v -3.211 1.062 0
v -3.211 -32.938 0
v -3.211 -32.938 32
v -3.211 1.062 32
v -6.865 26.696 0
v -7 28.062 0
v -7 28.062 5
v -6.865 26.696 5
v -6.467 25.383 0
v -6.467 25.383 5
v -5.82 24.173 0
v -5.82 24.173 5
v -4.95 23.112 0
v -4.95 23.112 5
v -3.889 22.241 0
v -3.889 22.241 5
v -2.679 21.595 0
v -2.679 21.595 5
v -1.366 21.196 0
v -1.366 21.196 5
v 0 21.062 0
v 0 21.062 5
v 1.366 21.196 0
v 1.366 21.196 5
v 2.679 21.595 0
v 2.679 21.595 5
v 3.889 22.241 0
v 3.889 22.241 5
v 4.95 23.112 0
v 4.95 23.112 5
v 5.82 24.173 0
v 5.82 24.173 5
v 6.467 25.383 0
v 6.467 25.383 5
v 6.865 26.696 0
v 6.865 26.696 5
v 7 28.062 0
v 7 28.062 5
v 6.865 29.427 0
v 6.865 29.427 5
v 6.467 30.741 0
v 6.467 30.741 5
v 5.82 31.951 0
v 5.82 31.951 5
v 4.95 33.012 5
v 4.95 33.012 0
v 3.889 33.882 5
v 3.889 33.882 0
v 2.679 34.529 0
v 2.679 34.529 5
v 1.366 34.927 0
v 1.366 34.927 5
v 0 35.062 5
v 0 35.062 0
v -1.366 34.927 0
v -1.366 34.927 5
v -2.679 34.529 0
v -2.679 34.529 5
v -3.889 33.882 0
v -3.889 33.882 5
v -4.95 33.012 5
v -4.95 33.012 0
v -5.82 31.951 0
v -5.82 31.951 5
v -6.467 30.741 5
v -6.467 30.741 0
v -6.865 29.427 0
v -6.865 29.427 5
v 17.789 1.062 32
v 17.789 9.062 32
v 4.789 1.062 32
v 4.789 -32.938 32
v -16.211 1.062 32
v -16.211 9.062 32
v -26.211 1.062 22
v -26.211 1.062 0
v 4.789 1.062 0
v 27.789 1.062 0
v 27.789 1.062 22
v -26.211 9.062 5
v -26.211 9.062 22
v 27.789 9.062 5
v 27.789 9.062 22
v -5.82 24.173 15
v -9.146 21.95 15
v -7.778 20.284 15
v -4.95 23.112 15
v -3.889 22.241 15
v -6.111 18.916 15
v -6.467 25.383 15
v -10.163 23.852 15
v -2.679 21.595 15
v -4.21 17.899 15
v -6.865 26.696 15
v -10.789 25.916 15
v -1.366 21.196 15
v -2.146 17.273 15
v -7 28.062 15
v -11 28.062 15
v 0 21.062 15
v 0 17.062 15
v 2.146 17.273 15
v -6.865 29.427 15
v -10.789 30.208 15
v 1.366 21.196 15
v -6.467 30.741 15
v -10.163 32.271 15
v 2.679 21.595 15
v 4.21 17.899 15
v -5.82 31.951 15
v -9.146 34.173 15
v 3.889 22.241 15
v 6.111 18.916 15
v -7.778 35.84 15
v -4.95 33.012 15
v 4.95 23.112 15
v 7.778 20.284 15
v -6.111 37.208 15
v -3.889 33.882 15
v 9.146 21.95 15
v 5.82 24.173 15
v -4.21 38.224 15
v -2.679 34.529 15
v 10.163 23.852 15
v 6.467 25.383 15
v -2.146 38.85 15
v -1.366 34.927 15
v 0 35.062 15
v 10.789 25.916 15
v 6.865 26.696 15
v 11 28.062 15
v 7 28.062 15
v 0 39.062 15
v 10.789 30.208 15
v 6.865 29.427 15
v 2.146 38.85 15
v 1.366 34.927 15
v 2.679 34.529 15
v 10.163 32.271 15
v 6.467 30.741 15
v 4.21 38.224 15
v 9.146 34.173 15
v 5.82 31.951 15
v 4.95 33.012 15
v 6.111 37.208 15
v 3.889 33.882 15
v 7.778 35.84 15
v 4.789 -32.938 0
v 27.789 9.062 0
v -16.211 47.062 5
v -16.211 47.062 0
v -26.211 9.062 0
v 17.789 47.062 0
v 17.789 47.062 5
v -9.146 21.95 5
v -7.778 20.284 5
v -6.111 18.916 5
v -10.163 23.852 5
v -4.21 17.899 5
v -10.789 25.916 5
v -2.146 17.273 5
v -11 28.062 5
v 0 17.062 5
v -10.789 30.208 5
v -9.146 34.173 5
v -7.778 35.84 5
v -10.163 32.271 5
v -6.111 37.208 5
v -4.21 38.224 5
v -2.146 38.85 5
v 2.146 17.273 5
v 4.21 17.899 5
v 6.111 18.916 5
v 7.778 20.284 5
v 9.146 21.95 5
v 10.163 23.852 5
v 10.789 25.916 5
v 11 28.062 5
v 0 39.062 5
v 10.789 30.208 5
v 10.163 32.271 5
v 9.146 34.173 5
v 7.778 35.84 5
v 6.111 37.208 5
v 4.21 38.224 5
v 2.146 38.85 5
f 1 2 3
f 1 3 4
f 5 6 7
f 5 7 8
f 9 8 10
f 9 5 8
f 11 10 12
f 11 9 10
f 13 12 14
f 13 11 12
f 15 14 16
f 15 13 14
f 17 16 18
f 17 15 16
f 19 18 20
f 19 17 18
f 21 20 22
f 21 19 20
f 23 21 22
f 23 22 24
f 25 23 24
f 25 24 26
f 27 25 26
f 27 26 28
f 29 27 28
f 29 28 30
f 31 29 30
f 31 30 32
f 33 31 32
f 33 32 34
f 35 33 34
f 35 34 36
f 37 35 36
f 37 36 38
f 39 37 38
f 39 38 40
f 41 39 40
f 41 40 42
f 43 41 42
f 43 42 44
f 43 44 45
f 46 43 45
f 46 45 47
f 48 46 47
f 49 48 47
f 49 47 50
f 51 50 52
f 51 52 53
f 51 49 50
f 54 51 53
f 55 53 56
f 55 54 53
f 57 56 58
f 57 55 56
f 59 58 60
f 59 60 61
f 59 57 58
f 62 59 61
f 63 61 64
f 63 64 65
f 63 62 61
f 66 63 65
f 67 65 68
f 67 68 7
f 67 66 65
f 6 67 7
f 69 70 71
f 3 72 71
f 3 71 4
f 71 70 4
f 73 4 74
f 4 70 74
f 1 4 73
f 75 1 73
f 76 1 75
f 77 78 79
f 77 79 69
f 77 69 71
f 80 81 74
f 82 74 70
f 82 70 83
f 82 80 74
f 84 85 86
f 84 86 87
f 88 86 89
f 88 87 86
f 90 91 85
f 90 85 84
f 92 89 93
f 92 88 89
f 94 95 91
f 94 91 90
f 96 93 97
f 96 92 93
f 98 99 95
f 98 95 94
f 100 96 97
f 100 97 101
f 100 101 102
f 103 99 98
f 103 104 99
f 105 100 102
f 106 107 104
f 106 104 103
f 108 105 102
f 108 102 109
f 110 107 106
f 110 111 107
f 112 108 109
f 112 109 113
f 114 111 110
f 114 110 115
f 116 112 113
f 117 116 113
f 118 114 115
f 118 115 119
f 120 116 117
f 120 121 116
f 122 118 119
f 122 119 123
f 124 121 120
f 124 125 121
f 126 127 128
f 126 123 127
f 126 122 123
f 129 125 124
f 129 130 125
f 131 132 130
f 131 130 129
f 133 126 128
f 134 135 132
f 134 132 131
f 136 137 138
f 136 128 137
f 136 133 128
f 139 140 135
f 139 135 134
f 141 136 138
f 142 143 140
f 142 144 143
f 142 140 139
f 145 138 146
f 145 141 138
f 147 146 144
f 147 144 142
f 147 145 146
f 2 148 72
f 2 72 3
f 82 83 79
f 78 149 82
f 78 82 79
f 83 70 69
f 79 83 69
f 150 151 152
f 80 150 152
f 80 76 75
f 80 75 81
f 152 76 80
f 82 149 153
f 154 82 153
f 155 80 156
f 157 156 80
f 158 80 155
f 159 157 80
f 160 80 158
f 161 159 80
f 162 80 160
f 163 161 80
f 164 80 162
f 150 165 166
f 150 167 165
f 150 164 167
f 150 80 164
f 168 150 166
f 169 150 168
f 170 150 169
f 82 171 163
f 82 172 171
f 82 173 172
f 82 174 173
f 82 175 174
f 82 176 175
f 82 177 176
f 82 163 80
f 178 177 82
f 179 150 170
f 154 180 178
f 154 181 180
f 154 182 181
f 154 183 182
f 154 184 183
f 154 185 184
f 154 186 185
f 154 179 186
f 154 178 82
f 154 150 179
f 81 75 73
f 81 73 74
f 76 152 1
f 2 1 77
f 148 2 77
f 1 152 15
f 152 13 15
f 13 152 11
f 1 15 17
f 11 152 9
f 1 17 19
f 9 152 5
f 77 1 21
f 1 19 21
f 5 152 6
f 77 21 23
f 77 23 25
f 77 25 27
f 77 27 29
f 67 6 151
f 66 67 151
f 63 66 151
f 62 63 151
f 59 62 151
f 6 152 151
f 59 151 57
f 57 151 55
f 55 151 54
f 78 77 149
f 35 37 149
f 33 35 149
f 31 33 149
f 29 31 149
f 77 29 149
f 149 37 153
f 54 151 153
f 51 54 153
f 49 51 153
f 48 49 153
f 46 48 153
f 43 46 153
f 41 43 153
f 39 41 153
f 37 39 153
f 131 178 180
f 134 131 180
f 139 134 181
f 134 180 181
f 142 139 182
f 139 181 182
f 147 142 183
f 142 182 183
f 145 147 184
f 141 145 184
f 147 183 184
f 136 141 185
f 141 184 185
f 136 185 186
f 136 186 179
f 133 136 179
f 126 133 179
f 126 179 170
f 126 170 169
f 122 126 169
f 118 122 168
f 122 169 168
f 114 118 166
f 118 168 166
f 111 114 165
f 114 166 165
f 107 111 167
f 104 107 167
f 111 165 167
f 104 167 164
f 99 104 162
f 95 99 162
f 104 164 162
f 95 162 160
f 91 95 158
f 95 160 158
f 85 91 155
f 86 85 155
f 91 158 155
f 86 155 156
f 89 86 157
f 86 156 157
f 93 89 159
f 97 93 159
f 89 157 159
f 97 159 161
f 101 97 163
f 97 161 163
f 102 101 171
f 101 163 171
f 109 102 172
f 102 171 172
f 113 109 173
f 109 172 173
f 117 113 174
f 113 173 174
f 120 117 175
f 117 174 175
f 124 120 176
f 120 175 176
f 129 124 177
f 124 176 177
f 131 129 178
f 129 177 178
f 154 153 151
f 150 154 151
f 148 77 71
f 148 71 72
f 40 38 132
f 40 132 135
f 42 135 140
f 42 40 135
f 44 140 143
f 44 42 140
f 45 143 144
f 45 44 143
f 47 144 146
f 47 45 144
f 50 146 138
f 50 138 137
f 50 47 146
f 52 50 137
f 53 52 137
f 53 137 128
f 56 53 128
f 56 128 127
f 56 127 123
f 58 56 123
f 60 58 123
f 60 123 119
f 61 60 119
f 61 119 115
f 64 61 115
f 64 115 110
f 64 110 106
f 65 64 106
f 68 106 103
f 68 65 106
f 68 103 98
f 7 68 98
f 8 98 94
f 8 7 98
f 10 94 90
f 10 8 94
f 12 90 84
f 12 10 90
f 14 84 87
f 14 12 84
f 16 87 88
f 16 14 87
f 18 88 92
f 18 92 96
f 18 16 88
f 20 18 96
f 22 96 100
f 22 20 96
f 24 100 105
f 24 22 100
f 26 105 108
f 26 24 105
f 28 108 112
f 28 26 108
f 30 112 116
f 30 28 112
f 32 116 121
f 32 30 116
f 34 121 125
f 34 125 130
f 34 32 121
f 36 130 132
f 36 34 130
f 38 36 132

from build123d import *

# Parameters (mm, degrees)
BOSS_EXTRUDE1_DEPTH = 32
CHAMFER3_SIZE       = 10
CHAMFER4_SIZE       = 10
BOSS_EXTRUDE3_DEPTH = 5
SKETCH6_R           = 11
SKETCH6_R_2         = 7
BOSS_EXTRUDE4_DEPTH = 10
CUT_EXTRUDE1_START  = -10
SKETCH7_R           = 7
CUT_EXTRUDE1_DEPTH  = 10


with BuildPart() as part:
    # Sketch2 → Boss-Extrude1 (new body)
    with BuildSketch(Plane.XY):
        Polygon((4.788542225, -32.938228069), (-3.211457775, -32.938228069), (-3.211457775, 1.061771931), (-26.211457775, 1.061771931), (-26.211457775, 9.061771931), (27.788542225, 9.061771931), (27.788542225, 1.061771931), (4.788542225, 1.061771931), align=None)
    extrude(amount=BOSS_EXTRUDE1_DEPTH)

    # Chamfer3
    chamfer3_edges = [part.edges().sort_by_distance(p)[0] for p in [
        (27.788542225, 5.061771931, 32),
    ]]
    chamfer(chamfer3_edges, length=CHAMFER3_SIZE)

    # Chamfer4
    chamfer4_edges = [part.edges().sort_by_distance(p)[0] for p in [
        (-26.211457775, 5.061771931, 32),
    ]]
    chamfer(chamfer4_edges, length=CHAMFER4_SIZE)

    # Sketch5 → Boss-Extrude3 (add)
    with BuildSketch(Plane.XY):
        Polygon((27.788542225, 9.061771931), (17.788542225, 47.061771931), (-16.211457775, 47.061771931), (-26.211457775, 9.061771931), align=None)
    extrude(amount=BOSS_EXTRUDE3_DEPTH)

    # Sketch6 → Boss-Extrude4 (add)
    with BuildSketch(Plane.XY.offset(5)):
        with Locations((0, 28.061771931)):
            Circle(SKETCH6_R)
        with Locations((0, 28.061771931)):
            Circle(SKETCH6_R_2, mode=Mode.SUBTRACT)
    extrude(amount=BOSS_EXTRUDE4_DEPTH)

    # Sketch7 → Cut-Extrude1 (cut)
    with BuildSketch(Plane.XY.offset(5).offset(CUT_EXTRUDE1_START)):
        with Locations(Location((0, 28.061771931, 0), (0, 0, 180))):
            Circle(SKETCH7_R)
    extrude(amount=CUT_EXTRUDE1_DEPTH, mode=Mode.SUBTRACT)


solid = part.part
